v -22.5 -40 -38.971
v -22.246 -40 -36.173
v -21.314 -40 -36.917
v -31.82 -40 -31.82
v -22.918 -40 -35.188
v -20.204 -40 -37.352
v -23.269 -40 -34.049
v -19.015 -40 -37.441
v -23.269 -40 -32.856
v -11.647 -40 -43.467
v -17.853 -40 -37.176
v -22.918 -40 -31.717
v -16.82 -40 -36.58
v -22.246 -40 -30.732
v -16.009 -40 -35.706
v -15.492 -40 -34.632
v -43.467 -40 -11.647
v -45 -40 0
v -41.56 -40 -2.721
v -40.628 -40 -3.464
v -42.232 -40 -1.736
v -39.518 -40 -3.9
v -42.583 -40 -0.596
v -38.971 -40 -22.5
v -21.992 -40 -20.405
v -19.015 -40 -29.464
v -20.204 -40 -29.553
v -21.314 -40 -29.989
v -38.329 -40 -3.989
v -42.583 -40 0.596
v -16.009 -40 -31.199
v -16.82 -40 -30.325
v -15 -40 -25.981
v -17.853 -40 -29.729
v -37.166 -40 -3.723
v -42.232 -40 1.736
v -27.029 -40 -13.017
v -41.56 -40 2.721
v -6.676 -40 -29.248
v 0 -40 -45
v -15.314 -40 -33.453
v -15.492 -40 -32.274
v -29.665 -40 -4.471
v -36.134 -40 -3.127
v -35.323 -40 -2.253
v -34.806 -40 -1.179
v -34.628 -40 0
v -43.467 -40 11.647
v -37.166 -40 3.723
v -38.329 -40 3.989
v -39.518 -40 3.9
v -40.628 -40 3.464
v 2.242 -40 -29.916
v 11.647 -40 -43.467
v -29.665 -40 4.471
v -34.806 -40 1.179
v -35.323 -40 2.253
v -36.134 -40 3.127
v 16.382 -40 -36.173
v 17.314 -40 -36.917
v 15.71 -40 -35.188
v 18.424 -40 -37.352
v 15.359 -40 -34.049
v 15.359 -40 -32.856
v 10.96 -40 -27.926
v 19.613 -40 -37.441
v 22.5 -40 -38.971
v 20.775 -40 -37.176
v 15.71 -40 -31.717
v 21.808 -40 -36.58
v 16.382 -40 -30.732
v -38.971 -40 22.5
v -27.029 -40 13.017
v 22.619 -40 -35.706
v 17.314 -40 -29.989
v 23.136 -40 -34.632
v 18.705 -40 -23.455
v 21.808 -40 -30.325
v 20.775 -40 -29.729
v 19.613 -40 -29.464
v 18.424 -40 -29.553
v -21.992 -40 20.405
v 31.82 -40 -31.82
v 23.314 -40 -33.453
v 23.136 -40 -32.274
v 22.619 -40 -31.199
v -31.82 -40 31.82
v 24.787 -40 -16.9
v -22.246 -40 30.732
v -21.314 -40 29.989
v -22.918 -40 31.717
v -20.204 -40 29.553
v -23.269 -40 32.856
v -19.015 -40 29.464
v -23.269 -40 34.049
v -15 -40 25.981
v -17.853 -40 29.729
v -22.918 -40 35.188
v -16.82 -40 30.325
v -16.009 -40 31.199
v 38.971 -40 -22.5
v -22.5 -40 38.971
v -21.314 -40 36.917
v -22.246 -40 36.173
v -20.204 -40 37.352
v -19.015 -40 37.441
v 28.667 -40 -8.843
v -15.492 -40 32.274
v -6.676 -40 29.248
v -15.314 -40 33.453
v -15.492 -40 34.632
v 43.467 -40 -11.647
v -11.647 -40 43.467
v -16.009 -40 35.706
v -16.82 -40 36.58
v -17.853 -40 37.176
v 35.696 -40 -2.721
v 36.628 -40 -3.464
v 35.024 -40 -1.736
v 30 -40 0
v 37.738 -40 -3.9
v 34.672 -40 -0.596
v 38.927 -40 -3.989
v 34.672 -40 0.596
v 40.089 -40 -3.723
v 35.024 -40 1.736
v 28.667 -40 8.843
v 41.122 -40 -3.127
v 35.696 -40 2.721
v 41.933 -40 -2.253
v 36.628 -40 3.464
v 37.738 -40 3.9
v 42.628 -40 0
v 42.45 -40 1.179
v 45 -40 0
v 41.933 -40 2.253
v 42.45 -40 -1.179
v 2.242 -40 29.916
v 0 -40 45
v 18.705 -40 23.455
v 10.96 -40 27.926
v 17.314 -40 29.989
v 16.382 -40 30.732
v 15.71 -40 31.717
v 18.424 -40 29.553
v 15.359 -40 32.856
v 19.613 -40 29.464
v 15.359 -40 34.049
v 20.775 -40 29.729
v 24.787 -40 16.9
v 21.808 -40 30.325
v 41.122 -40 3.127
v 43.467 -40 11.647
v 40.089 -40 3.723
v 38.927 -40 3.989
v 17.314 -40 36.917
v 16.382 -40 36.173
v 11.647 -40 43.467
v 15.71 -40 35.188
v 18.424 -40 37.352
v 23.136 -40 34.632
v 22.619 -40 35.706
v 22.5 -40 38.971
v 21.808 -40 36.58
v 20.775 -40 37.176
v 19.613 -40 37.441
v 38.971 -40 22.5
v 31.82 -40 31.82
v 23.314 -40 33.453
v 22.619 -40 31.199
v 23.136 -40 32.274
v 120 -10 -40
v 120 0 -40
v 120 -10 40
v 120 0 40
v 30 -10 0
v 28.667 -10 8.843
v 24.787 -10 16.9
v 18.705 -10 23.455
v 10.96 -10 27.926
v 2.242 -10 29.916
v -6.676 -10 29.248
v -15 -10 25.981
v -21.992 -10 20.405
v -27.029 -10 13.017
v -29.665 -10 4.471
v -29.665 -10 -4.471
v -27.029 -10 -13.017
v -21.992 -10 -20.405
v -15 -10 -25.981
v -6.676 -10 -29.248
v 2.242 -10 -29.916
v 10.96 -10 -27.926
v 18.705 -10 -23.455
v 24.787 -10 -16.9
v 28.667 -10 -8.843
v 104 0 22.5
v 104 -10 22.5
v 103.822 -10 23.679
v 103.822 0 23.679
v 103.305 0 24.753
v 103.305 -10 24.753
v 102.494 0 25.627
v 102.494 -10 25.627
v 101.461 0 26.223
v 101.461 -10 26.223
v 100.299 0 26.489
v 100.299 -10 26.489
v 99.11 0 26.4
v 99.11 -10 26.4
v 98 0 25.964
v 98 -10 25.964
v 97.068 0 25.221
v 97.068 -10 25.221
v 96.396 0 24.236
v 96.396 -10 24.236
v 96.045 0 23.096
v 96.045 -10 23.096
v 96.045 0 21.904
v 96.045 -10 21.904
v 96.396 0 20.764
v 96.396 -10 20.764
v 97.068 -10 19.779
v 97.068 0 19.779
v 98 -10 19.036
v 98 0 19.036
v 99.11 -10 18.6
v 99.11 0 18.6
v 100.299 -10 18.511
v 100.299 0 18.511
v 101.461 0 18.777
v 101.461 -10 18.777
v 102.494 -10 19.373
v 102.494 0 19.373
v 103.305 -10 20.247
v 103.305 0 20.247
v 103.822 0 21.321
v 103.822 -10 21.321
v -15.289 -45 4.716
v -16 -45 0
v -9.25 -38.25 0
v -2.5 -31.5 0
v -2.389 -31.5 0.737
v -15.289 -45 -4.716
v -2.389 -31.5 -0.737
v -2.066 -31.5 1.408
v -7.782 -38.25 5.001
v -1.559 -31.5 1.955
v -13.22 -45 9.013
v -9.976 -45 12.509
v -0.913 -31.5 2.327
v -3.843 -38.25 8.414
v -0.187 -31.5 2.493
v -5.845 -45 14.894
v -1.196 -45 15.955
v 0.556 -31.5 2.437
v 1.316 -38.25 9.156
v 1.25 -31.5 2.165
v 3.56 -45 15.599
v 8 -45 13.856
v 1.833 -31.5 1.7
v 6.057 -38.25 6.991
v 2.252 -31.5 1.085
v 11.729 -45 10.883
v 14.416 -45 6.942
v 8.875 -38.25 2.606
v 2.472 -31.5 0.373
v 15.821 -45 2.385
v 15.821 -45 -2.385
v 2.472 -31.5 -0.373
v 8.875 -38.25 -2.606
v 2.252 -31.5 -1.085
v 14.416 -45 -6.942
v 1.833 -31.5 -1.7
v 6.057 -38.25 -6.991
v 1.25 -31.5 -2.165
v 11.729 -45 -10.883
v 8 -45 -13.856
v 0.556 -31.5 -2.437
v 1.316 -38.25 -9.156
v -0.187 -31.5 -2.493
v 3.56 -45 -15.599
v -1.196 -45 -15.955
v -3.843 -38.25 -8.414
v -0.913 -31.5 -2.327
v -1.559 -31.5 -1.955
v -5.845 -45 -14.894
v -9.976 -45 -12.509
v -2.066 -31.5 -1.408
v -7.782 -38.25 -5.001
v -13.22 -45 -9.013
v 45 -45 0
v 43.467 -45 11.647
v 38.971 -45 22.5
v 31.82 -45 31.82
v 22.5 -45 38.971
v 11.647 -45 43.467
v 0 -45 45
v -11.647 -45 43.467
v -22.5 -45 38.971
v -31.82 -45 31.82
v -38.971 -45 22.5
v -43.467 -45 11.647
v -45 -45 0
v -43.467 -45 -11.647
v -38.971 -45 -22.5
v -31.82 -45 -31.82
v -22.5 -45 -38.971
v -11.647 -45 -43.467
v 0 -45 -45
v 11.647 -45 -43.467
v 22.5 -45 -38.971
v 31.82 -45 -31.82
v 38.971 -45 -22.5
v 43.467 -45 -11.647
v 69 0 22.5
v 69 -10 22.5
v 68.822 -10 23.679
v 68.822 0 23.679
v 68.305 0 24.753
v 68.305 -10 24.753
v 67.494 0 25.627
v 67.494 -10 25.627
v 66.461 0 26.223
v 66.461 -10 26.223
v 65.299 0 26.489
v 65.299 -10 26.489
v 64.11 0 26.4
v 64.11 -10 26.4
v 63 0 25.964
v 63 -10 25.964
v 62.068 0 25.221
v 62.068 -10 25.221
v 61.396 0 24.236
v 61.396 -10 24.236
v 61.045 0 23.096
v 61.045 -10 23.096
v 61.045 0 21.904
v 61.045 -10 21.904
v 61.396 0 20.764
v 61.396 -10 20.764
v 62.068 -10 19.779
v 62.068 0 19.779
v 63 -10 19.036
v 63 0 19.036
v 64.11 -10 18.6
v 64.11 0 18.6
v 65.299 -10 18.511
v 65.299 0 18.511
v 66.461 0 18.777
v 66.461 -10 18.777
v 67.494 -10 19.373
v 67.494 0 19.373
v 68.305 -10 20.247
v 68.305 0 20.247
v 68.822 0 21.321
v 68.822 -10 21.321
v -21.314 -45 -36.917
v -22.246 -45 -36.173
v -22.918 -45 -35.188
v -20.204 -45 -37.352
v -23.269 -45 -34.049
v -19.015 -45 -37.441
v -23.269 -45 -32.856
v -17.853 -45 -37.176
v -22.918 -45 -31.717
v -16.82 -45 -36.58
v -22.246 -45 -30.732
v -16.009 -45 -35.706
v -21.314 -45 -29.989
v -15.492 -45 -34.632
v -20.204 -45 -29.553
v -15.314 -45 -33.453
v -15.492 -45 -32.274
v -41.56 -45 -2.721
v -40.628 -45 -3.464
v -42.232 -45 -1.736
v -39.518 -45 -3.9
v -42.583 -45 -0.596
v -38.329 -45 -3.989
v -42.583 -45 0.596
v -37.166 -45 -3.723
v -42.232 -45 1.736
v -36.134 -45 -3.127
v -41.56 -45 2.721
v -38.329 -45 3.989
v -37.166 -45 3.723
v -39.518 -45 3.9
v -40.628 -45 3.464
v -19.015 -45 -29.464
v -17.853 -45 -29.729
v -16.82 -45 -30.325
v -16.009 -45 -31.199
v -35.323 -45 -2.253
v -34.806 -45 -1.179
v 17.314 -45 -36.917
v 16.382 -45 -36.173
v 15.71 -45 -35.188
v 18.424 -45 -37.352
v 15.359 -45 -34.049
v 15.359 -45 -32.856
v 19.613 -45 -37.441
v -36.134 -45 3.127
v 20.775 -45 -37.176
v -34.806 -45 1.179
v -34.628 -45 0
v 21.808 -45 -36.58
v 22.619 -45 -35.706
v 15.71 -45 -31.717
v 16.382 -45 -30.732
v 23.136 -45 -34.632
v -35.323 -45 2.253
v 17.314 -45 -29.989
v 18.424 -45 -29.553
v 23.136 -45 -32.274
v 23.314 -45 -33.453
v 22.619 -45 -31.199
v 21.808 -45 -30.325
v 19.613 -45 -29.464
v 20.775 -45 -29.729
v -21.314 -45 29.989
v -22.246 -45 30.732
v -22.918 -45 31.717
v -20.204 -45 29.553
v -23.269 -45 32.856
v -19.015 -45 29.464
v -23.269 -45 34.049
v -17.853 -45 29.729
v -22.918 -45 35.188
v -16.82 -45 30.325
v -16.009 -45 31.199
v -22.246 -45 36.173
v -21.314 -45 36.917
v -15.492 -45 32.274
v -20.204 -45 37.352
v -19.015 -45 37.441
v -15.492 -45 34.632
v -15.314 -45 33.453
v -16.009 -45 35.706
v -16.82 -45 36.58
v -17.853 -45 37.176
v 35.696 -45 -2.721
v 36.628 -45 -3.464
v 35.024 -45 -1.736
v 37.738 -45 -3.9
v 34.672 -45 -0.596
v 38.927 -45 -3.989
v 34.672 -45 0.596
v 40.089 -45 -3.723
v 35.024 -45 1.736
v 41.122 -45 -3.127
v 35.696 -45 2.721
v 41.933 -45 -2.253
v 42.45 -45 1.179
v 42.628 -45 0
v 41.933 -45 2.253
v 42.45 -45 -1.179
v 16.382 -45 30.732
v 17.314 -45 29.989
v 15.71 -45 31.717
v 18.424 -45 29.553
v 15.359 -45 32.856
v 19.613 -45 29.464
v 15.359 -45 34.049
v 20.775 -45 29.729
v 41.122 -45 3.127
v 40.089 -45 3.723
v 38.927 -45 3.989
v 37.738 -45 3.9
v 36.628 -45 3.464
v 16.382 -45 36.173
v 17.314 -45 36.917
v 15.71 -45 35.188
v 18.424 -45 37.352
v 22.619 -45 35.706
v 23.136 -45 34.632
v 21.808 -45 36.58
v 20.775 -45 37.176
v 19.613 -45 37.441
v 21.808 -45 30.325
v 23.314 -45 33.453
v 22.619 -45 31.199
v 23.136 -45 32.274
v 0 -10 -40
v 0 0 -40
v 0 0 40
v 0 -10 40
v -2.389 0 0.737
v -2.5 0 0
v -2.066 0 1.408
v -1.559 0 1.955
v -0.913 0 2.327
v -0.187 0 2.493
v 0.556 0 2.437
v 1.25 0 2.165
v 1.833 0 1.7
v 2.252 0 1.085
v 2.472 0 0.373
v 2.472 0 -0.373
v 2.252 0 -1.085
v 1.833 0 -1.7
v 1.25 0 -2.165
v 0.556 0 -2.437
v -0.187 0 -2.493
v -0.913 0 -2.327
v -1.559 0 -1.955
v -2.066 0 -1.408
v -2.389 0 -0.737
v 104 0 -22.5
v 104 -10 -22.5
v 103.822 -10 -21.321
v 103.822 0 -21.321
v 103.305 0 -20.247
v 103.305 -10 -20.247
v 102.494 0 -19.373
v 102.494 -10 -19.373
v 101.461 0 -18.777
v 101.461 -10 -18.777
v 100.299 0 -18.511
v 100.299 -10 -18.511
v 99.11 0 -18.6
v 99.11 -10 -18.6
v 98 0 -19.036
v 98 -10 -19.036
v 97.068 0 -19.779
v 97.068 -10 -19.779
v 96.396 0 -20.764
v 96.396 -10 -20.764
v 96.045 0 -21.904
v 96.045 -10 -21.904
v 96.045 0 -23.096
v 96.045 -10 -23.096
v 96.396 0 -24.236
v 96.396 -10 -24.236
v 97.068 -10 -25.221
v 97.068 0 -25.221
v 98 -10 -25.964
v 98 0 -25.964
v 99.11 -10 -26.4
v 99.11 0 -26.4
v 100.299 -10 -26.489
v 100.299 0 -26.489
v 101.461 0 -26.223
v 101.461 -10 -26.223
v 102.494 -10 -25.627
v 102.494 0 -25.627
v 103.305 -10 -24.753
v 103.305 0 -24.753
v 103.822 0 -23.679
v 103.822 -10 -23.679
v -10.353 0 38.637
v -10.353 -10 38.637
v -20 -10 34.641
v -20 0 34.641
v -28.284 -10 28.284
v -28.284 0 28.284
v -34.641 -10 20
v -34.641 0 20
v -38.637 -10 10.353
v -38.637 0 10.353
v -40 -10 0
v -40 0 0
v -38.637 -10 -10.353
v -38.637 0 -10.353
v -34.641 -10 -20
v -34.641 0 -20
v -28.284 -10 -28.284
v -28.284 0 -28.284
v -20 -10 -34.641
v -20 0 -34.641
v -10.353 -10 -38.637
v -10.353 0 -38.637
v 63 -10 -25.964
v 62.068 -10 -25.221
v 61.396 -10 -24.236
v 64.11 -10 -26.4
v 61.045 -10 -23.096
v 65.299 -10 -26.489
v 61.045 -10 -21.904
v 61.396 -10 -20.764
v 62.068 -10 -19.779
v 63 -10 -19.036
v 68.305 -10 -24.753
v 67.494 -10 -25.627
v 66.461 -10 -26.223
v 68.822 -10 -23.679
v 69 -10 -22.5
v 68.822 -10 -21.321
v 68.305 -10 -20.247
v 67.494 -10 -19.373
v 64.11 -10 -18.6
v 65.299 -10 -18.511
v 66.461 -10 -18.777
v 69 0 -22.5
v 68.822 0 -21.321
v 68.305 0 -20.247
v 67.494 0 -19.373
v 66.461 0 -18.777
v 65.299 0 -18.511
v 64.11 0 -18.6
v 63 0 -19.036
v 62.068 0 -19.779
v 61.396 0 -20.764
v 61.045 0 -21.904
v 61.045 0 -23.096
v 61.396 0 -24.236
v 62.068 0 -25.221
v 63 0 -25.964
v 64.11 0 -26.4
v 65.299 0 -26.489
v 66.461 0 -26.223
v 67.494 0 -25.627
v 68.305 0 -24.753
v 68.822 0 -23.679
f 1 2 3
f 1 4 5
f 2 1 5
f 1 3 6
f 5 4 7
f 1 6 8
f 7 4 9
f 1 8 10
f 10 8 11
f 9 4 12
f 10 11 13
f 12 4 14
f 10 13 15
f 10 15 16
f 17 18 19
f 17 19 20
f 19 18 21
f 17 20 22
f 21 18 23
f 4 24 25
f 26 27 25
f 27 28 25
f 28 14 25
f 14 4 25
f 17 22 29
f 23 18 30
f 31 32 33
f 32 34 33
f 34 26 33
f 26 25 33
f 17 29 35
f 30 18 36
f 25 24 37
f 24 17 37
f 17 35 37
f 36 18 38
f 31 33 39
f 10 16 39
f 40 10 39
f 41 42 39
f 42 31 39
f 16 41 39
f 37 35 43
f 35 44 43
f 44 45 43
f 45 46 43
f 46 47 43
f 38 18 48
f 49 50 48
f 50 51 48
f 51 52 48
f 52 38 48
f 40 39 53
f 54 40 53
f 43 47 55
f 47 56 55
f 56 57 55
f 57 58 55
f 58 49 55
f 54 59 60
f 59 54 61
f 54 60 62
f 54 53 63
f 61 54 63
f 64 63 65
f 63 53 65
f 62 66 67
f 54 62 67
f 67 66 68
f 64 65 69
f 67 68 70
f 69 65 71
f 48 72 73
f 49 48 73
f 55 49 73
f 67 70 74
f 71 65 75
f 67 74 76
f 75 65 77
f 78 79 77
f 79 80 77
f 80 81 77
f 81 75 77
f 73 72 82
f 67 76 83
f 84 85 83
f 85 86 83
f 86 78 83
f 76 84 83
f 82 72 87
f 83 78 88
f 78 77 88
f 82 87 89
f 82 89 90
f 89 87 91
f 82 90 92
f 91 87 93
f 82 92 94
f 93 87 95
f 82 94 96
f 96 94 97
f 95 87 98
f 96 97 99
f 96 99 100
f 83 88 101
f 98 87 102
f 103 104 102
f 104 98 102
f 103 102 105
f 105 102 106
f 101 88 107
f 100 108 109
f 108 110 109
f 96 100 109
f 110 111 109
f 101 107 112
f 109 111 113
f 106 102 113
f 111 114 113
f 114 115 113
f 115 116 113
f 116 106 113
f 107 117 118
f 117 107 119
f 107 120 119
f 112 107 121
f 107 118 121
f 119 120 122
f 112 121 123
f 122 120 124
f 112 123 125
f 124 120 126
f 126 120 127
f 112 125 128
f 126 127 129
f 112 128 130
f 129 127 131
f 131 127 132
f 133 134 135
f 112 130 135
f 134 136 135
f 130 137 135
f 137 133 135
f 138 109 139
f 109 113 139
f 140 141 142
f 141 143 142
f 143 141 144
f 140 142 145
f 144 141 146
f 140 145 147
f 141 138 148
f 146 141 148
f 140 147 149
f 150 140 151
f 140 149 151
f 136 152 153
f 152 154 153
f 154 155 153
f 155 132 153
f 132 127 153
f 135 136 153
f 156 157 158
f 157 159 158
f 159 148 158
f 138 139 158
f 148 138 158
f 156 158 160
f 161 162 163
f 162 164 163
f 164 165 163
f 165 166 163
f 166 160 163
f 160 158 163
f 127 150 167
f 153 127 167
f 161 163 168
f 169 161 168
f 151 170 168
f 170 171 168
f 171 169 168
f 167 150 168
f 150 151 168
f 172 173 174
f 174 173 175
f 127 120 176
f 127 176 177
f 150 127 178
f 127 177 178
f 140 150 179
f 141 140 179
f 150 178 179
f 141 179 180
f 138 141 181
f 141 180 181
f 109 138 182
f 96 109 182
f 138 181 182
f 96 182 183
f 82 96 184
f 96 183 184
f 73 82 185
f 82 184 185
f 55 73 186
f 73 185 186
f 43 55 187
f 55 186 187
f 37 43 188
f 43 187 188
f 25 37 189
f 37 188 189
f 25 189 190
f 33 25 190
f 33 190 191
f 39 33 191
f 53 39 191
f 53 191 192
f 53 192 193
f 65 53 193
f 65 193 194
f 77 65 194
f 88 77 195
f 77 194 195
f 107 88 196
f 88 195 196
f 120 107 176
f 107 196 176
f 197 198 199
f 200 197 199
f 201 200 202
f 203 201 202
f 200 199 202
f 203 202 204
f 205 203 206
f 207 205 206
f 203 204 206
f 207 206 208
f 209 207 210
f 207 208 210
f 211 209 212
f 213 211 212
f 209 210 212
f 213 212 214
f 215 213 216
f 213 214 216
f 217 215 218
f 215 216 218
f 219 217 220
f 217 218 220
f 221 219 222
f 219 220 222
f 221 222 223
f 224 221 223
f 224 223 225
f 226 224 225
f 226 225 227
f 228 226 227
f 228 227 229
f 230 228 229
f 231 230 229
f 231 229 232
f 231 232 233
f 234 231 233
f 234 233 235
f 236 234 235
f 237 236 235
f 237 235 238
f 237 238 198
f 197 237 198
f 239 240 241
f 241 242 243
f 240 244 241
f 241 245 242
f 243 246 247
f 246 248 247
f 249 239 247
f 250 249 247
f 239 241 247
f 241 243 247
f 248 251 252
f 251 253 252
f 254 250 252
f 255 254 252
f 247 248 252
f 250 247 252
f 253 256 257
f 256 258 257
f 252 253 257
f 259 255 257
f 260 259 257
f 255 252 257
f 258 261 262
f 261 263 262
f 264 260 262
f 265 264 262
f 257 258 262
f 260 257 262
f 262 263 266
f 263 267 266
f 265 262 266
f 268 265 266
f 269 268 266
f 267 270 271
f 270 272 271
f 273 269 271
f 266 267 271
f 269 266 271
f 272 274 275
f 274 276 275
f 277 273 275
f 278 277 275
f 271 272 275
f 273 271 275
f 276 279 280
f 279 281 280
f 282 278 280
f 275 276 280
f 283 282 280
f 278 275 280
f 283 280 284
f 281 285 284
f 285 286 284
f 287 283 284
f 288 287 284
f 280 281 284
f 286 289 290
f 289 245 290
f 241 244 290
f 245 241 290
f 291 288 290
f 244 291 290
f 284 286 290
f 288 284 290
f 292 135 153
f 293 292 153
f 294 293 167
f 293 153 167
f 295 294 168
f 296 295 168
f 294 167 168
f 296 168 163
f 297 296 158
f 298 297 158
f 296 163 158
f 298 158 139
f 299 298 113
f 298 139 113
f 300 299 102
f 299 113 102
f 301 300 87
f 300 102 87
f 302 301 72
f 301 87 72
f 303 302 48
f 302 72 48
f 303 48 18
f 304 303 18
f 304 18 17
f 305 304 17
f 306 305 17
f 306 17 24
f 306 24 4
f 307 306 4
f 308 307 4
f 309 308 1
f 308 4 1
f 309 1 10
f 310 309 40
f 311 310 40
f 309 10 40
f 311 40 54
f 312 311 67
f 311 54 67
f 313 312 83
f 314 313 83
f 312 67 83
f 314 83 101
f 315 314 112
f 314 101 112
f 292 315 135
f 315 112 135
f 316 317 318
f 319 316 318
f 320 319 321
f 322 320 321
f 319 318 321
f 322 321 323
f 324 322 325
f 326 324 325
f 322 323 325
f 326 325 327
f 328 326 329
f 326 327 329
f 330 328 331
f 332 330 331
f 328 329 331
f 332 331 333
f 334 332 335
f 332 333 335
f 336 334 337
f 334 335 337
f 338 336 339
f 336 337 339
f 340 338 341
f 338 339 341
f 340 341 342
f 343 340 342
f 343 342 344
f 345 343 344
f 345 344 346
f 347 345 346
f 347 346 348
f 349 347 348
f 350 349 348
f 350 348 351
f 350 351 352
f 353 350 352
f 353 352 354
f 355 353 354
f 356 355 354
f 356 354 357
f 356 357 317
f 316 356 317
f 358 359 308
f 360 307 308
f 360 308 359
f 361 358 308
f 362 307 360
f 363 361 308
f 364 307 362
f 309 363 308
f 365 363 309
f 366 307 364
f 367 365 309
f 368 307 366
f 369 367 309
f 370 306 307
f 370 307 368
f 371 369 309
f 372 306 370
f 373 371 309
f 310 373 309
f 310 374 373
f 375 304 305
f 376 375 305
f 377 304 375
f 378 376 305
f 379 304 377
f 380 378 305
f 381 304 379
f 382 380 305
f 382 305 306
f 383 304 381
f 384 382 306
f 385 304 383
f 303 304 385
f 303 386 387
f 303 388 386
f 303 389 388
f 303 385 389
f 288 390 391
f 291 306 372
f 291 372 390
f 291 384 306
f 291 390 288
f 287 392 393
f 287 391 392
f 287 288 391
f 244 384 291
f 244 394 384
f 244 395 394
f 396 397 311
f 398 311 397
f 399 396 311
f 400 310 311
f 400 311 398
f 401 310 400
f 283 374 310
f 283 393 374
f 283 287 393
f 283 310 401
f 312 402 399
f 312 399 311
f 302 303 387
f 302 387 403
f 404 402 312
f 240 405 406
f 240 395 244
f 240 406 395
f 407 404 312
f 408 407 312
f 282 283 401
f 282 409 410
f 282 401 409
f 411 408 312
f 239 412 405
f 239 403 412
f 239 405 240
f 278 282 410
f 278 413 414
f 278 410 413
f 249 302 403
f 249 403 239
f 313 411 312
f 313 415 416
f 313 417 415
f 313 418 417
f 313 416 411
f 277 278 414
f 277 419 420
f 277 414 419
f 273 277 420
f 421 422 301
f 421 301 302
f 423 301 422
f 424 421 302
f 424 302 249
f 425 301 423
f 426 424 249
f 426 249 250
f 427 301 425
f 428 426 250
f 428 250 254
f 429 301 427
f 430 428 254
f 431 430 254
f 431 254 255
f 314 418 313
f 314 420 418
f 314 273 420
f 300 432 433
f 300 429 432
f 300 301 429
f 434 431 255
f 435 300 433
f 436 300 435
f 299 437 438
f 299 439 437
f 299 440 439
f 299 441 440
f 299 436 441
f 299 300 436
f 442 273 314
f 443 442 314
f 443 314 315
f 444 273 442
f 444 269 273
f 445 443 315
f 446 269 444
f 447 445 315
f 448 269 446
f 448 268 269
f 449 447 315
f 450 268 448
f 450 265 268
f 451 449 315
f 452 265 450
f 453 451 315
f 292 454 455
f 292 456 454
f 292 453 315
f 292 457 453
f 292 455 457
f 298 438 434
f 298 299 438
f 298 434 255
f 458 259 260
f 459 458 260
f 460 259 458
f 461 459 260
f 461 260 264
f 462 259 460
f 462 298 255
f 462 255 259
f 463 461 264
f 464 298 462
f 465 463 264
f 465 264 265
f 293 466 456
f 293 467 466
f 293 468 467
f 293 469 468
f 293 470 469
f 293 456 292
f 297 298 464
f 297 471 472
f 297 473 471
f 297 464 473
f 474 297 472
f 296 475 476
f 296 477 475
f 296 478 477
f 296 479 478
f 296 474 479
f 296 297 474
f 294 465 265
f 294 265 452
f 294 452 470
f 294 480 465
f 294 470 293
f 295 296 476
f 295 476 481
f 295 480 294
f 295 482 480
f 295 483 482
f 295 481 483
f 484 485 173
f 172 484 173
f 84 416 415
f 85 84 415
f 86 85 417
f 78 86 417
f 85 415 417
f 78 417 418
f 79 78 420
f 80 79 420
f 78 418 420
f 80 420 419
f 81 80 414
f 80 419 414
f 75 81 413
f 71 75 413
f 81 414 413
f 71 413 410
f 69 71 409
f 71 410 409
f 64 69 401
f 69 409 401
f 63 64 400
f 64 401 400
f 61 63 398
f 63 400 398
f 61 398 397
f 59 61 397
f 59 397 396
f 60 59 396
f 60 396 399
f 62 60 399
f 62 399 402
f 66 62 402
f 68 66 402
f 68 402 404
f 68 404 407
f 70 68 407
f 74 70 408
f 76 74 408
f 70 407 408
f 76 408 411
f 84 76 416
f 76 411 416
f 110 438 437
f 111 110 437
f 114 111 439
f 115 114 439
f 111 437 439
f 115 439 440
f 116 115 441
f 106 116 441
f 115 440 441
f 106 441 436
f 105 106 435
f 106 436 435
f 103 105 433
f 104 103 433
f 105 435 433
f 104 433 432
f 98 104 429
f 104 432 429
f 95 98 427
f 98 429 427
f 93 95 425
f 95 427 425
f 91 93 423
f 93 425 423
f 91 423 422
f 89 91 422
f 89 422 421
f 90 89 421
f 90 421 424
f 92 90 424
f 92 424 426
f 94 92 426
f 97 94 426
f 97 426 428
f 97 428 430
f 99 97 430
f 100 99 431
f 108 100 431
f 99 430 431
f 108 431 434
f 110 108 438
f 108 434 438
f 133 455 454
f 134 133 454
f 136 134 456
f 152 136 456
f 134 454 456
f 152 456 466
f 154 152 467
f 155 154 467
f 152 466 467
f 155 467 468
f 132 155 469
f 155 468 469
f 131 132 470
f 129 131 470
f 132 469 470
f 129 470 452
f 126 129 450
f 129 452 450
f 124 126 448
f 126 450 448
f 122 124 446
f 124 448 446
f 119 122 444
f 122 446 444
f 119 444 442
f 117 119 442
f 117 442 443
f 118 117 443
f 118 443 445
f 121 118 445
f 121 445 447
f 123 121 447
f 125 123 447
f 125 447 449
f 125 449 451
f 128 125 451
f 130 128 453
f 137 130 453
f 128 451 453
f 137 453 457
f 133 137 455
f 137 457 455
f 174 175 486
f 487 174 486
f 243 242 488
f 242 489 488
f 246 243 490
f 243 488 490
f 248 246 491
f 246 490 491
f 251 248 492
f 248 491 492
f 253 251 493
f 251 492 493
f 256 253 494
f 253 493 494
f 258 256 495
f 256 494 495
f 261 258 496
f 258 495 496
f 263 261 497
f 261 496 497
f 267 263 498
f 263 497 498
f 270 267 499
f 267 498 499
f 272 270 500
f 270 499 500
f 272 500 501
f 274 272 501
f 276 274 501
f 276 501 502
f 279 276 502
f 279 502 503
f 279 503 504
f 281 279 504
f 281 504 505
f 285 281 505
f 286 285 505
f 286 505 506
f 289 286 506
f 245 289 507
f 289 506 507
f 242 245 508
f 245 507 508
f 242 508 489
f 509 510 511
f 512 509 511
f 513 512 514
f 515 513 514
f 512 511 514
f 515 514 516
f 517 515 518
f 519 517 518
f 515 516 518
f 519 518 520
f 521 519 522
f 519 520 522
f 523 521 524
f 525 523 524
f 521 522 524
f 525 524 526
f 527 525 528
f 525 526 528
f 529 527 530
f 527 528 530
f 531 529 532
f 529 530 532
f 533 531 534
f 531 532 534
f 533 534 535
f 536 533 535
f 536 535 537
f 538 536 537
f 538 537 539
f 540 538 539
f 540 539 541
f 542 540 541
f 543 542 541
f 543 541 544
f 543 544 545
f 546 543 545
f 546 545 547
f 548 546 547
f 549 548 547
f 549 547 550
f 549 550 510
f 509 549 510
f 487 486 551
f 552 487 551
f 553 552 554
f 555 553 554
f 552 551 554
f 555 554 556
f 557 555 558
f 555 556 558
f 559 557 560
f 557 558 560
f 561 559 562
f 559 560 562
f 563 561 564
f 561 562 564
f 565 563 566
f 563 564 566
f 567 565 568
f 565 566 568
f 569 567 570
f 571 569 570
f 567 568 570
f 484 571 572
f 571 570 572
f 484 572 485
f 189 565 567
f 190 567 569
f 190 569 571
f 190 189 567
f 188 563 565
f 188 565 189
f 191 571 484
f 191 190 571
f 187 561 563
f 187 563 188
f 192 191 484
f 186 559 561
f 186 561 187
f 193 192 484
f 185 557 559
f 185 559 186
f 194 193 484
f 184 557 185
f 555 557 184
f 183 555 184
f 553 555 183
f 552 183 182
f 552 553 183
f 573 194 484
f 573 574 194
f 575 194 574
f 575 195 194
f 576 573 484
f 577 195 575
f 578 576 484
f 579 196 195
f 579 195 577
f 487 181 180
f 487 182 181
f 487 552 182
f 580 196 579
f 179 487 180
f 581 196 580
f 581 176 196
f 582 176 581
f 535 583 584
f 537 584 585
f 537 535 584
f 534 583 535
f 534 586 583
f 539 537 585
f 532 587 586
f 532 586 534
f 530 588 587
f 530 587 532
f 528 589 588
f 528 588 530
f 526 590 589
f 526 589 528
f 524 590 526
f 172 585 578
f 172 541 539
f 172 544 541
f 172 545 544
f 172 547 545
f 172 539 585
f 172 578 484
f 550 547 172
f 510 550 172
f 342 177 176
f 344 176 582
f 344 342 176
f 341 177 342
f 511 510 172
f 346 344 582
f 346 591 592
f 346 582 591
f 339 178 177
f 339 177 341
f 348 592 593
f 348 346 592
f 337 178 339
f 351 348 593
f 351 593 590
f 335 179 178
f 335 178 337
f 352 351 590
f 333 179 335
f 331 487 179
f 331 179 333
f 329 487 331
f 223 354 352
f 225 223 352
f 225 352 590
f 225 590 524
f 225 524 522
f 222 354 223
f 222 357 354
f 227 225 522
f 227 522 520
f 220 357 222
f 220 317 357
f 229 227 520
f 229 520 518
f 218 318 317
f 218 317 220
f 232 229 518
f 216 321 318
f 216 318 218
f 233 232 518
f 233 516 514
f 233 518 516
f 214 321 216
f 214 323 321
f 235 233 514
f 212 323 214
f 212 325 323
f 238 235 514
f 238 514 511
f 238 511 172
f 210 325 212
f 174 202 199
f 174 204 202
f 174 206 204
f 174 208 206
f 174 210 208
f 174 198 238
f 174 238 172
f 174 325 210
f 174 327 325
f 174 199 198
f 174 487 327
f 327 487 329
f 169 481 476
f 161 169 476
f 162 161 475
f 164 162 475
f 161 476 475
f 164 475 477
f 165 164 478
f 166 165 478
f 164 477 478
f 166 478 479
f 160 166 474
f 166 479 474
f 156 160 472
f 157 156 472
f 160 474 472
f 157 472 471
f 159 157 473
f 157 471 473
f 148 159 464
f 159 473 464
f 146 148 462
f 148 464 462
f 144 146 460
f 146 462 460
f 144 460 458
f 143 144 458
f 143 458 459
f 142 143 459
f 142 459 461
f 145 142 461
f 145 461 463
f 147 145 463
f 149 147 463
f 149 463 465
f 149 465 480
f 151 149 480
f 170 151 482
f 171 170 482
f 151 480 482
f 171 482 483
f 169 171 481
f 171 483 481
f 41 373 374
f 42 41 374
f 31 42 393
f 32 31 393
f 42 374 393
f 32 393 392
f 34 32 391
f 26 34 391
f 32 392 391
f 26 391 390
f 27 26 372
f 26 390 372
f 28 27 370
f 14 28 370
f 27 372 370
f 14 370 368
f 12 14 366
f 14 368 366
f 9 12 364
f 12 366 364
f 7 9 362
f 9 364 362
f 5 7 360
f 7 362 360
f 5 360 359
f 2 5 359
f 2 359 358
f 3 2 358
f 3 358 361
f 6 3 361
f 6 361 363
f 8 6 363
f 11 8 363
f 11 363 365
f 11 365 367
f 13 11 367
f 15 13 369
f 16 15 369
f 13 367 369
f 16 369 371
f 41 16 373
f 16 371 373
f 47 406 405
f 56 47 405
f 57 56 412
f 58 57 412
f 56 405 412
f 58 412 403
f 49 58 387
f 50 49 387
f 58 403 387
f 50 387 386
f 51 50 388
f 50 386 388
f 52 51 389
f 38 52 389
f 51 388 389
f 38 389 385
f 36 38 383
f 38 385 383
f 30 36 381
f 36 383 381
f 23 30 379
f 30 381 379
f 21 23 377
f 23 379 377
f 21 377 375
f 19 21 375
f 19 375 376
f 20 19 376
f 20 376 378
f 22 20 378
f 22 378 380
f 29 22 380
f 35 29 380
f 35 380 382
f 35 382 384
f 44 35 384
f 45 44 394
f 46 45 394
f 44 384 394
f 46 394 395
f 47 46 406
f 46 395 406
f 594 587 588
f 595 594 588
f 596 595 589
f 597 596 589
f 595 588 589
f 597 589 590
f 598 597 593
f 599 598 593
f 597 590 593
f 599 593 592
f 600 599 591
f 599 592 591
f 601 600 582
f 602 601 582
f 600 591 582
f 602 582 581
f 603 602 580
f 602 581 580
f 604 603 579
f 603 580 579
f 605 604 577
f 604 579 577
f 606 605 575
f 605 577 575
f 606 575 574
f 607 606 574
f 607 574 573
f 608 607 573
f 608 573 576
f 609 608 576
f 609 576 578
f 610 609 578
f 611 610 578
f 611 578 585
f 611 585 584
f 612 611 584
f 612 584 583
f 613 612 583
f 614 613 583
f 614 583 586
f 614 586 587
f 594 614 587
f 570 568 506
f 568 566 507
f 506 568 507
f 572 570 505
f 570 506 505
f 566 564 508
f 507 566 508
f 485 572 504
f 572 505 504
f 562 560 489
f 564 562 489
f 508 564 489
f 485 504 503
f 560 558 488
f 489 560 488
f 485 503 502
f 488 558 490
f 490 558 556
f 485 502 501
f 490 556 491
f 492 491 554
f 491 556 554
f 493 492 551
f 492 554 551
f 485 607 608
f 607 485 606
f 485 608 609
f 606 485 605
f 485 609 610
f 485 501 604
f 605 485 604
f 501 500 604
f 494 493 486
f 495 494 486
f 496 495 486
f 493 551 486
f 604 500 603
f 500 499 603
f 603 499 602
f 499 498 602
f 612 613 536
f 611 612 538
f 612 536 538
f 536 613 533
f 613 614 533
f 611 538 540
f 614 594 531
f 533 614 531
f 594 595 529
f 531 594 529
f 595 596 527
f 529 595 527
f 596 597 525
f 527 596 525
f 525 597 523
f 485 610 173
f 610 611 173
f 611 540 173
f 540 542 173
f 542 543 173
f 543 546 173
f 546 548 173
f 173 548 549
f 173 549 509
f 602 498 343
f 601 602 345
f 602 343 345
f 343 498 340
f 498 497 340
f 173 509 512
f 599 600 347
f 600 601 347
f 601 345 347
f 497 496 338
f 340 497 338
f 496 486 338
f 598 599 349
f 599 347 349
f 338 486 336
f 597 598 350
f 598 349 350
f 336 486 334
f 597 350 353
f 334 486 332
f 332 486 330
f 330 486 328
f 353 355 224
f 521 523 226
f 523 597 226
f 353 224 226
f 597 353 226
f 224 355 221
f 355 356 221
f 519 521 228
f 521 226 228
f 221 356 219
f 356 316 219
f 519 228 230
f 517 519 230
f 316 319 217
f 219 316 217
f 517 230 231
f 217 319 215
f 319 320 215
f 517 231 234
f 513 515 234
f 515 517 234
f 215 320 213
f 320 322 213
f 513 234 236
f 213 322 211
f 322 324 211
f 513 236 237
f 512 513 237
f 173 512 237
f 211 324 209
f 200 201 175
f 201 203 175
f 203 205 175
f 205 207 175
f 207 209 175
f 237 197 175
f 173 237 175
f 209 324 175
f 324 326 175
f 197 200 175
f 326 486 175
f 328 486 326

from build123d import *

# Parameters (mm, degrees)
F1_DEPTH        = 10
F2_R            = 30
F3_DEPTH        = 30
F4_R            = 45
F4_R_2          = 30
F5_DEPTH        = 5
F6_R            = 4
F7_DEPTH        = 5
F8_R            = 4
F9_DEPTH        = 10.001
F11_D           = 5
F11_CSINK_D     = 32
F11_CSINK_ANGLE = 90


with BuildPart() as f1:
    # F0 (on Front) → F1 (new body)
    with BuildSketch(Plane.XZ):
        with BuildLine():
            Line((120, 40), (0, 40))
            ThreePointArc((0, 40), (-40, 0), (0, -40))
            Line((0, -40), (120, -40))
            Line((120, -40), (120, 40))
        make_face()
    extrude(amount=F1_DEPTH)

    # F2 (on face) → F3 (join)
    with BuildSketch(Plane.XZ.offset(10)):
        Circle(F2_R)
    extrude(amount=F3_DEPTH)

    # F4 (on face) → F5 (join)
    with BuildSketch(Plane.XZ.offset(40)):
        Circle(F4_R)
        Circle(F4_R_2, mode=Mode.SUBTRACT)
        Circle(F4_R_2)
    extrude(amount=F5_DEPTH)

    # F6 (on face) → F7 (cut, through all)
    with BuildSketch(Plane.XZ.offset(45)):
        with Locations((-19.3139053881, 33.4526654248)):
            Circle(F6_R)
        with Locations((19.3139053881, 33.4526654248)):
            Circle(F6_R)
        with Locations((38.6278107762, 0)):
            Circle(F6_R)
        with Locations((19.3139053881, -33.4526654248)):
            Circle(F6_R)
        with Locations((-19.3139053881, -33.4526654248)):
            Circle(F6_R)
        with Locations((-38.6278107762, 0)):
            Circle(F6_R)
    extrude(amount=-F7_DEPTH, mode=Mode.SUBTRACT)

    # F8 (on face) → F9 (cut, through all)
    with BuildSketch(Plane.XZ.offset(10)):
        with Locations((65, 22.5)):
            Circle(F8_R)
        with Locations((100, 22.5)):
            Circle(F8_R)
        with Locations((65, -22.5)):
            Circle(F8_R)
        with Locations((100, -22.5)):
            Circle(F8_R)
    extrude(amount=-F9_DEPTH, mode=Mode.SUBTRACT)

    # F11 (through all)
    with Locations(Plane.XZ.offset(45)):
        with Locations((0, 0)):
            CounterSinkHole(F11_D / 2, F11_CSINK_D / 2, counter_sink_angle=F11_CSINK_ANGLE)


solid = f1.part
